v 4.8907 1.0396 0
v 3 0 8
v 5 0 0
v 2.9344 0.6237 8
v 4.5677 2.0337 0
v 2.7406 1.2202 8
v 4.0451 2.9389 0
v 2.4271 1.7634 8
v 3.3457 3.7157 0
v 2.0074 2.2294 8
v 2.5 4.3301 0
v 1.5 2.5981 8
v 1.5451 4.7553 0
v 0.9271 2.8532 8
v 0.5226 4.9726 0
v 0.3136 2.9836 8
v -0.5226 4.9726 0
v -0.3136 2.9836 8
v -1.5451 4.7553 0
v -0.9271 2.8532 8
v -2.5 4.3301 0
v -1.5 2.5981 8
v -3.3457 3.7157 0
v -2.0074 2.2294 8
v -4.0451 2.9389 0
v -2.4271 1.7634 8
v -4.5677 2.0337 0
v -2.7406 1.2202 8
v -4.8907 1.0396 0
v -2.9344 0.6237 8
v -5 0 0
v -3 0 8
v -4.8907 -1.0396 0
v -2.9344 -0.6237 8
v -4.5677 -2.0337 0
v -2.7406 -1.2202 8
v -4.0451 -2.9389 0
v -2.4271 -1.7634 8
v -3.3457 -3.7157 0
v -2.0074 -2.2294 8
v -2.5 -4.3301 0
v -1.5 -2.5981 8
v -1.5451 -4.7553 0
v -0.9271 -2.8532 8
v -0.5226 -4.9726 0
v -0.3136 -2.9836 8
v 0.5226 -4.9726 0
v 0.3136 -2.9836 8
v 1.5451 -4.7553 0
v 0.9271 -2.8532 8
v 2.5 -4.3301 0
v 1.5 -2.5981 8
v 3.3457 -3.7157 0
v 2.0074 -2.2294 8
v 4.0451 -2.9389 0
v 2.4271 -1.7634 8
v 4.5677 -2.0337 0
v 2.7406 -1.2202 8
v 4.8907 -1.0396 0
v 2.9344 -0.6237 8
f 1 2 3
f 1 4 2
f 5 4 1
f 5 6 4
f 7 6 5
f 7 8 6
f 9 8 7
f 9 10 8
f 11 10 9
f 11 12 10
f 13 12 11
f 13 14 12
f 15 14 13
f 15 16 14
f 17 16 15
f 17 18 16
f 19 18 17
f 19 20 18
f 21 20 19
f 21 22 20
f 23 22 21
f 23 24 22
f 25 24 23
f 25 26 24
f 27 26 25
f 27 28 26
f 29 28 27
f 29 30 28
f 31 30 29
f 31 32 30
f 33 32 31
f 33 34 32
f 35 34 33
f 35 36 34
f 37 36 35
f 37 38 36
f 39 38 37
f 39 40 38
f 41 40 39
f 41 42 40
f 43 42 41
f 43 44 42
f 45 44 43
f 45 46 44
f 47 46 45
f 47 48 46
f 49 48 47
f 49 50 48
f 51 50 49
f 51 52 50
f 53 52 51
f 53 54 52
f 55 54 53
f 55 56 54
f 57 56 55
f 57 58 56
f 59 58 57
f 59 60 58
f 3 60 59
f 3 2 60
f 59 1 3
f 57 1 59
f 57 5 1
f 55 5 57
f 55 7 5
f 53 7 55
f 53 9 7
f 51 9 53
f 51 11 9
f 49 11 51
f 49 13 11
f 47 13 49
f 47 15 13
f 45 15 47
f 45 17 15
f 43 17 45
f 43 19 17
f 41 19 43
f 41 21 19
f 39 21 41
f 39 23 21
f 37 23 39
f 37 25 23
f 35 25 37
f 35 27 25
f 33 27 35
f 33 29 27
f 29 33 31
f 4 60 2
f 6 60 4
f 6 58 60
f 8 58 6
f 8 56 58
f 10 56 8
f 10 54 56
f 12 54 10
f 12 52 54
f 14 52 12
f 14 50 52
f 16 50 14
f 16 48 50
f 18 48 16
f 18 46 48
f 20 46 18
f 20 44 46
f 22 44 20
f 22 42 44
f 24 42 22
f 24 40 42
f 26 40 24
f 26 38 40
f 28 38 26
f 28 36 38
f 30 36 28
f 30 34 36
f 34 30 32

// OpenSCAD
/*
 * OpenSCAD Workshop Examples
 * Copyright (c) 2013 Anar Software LLC. < http://anars.com >
 *
 * This program is free software: you can redistribute it and/or modify it under
 * the terms of the GNU General Public License as published by the Free Software
 * Foundation, either version 3 of the License, or (at your option) any later
 * version.
 *
 * This program is distributed in the hope that it will be useful, but WITHOUT
 * ANY WARRANTY; without even the implied warranty of MERCHANTABILITY or FITNESS
 * FOR A PARTICULAR PURPOSE. See the GNU General Public License for more details.
 *
 * You should have received a copy of the GNU General Public License along with
 * this program. If not, see < http://www.gnu.org/licenses/ >
 *
 */
/*

Creates a cone with bottom end radius is 5 unit radius, top end radius 3 unit and 8 unit height.

Parameters :

	cylinder(r1 = x, r2 = x, h = 3);

*/

$fs = 0;

cylinder(r1 = 5, r2 = 3, h = 8);
